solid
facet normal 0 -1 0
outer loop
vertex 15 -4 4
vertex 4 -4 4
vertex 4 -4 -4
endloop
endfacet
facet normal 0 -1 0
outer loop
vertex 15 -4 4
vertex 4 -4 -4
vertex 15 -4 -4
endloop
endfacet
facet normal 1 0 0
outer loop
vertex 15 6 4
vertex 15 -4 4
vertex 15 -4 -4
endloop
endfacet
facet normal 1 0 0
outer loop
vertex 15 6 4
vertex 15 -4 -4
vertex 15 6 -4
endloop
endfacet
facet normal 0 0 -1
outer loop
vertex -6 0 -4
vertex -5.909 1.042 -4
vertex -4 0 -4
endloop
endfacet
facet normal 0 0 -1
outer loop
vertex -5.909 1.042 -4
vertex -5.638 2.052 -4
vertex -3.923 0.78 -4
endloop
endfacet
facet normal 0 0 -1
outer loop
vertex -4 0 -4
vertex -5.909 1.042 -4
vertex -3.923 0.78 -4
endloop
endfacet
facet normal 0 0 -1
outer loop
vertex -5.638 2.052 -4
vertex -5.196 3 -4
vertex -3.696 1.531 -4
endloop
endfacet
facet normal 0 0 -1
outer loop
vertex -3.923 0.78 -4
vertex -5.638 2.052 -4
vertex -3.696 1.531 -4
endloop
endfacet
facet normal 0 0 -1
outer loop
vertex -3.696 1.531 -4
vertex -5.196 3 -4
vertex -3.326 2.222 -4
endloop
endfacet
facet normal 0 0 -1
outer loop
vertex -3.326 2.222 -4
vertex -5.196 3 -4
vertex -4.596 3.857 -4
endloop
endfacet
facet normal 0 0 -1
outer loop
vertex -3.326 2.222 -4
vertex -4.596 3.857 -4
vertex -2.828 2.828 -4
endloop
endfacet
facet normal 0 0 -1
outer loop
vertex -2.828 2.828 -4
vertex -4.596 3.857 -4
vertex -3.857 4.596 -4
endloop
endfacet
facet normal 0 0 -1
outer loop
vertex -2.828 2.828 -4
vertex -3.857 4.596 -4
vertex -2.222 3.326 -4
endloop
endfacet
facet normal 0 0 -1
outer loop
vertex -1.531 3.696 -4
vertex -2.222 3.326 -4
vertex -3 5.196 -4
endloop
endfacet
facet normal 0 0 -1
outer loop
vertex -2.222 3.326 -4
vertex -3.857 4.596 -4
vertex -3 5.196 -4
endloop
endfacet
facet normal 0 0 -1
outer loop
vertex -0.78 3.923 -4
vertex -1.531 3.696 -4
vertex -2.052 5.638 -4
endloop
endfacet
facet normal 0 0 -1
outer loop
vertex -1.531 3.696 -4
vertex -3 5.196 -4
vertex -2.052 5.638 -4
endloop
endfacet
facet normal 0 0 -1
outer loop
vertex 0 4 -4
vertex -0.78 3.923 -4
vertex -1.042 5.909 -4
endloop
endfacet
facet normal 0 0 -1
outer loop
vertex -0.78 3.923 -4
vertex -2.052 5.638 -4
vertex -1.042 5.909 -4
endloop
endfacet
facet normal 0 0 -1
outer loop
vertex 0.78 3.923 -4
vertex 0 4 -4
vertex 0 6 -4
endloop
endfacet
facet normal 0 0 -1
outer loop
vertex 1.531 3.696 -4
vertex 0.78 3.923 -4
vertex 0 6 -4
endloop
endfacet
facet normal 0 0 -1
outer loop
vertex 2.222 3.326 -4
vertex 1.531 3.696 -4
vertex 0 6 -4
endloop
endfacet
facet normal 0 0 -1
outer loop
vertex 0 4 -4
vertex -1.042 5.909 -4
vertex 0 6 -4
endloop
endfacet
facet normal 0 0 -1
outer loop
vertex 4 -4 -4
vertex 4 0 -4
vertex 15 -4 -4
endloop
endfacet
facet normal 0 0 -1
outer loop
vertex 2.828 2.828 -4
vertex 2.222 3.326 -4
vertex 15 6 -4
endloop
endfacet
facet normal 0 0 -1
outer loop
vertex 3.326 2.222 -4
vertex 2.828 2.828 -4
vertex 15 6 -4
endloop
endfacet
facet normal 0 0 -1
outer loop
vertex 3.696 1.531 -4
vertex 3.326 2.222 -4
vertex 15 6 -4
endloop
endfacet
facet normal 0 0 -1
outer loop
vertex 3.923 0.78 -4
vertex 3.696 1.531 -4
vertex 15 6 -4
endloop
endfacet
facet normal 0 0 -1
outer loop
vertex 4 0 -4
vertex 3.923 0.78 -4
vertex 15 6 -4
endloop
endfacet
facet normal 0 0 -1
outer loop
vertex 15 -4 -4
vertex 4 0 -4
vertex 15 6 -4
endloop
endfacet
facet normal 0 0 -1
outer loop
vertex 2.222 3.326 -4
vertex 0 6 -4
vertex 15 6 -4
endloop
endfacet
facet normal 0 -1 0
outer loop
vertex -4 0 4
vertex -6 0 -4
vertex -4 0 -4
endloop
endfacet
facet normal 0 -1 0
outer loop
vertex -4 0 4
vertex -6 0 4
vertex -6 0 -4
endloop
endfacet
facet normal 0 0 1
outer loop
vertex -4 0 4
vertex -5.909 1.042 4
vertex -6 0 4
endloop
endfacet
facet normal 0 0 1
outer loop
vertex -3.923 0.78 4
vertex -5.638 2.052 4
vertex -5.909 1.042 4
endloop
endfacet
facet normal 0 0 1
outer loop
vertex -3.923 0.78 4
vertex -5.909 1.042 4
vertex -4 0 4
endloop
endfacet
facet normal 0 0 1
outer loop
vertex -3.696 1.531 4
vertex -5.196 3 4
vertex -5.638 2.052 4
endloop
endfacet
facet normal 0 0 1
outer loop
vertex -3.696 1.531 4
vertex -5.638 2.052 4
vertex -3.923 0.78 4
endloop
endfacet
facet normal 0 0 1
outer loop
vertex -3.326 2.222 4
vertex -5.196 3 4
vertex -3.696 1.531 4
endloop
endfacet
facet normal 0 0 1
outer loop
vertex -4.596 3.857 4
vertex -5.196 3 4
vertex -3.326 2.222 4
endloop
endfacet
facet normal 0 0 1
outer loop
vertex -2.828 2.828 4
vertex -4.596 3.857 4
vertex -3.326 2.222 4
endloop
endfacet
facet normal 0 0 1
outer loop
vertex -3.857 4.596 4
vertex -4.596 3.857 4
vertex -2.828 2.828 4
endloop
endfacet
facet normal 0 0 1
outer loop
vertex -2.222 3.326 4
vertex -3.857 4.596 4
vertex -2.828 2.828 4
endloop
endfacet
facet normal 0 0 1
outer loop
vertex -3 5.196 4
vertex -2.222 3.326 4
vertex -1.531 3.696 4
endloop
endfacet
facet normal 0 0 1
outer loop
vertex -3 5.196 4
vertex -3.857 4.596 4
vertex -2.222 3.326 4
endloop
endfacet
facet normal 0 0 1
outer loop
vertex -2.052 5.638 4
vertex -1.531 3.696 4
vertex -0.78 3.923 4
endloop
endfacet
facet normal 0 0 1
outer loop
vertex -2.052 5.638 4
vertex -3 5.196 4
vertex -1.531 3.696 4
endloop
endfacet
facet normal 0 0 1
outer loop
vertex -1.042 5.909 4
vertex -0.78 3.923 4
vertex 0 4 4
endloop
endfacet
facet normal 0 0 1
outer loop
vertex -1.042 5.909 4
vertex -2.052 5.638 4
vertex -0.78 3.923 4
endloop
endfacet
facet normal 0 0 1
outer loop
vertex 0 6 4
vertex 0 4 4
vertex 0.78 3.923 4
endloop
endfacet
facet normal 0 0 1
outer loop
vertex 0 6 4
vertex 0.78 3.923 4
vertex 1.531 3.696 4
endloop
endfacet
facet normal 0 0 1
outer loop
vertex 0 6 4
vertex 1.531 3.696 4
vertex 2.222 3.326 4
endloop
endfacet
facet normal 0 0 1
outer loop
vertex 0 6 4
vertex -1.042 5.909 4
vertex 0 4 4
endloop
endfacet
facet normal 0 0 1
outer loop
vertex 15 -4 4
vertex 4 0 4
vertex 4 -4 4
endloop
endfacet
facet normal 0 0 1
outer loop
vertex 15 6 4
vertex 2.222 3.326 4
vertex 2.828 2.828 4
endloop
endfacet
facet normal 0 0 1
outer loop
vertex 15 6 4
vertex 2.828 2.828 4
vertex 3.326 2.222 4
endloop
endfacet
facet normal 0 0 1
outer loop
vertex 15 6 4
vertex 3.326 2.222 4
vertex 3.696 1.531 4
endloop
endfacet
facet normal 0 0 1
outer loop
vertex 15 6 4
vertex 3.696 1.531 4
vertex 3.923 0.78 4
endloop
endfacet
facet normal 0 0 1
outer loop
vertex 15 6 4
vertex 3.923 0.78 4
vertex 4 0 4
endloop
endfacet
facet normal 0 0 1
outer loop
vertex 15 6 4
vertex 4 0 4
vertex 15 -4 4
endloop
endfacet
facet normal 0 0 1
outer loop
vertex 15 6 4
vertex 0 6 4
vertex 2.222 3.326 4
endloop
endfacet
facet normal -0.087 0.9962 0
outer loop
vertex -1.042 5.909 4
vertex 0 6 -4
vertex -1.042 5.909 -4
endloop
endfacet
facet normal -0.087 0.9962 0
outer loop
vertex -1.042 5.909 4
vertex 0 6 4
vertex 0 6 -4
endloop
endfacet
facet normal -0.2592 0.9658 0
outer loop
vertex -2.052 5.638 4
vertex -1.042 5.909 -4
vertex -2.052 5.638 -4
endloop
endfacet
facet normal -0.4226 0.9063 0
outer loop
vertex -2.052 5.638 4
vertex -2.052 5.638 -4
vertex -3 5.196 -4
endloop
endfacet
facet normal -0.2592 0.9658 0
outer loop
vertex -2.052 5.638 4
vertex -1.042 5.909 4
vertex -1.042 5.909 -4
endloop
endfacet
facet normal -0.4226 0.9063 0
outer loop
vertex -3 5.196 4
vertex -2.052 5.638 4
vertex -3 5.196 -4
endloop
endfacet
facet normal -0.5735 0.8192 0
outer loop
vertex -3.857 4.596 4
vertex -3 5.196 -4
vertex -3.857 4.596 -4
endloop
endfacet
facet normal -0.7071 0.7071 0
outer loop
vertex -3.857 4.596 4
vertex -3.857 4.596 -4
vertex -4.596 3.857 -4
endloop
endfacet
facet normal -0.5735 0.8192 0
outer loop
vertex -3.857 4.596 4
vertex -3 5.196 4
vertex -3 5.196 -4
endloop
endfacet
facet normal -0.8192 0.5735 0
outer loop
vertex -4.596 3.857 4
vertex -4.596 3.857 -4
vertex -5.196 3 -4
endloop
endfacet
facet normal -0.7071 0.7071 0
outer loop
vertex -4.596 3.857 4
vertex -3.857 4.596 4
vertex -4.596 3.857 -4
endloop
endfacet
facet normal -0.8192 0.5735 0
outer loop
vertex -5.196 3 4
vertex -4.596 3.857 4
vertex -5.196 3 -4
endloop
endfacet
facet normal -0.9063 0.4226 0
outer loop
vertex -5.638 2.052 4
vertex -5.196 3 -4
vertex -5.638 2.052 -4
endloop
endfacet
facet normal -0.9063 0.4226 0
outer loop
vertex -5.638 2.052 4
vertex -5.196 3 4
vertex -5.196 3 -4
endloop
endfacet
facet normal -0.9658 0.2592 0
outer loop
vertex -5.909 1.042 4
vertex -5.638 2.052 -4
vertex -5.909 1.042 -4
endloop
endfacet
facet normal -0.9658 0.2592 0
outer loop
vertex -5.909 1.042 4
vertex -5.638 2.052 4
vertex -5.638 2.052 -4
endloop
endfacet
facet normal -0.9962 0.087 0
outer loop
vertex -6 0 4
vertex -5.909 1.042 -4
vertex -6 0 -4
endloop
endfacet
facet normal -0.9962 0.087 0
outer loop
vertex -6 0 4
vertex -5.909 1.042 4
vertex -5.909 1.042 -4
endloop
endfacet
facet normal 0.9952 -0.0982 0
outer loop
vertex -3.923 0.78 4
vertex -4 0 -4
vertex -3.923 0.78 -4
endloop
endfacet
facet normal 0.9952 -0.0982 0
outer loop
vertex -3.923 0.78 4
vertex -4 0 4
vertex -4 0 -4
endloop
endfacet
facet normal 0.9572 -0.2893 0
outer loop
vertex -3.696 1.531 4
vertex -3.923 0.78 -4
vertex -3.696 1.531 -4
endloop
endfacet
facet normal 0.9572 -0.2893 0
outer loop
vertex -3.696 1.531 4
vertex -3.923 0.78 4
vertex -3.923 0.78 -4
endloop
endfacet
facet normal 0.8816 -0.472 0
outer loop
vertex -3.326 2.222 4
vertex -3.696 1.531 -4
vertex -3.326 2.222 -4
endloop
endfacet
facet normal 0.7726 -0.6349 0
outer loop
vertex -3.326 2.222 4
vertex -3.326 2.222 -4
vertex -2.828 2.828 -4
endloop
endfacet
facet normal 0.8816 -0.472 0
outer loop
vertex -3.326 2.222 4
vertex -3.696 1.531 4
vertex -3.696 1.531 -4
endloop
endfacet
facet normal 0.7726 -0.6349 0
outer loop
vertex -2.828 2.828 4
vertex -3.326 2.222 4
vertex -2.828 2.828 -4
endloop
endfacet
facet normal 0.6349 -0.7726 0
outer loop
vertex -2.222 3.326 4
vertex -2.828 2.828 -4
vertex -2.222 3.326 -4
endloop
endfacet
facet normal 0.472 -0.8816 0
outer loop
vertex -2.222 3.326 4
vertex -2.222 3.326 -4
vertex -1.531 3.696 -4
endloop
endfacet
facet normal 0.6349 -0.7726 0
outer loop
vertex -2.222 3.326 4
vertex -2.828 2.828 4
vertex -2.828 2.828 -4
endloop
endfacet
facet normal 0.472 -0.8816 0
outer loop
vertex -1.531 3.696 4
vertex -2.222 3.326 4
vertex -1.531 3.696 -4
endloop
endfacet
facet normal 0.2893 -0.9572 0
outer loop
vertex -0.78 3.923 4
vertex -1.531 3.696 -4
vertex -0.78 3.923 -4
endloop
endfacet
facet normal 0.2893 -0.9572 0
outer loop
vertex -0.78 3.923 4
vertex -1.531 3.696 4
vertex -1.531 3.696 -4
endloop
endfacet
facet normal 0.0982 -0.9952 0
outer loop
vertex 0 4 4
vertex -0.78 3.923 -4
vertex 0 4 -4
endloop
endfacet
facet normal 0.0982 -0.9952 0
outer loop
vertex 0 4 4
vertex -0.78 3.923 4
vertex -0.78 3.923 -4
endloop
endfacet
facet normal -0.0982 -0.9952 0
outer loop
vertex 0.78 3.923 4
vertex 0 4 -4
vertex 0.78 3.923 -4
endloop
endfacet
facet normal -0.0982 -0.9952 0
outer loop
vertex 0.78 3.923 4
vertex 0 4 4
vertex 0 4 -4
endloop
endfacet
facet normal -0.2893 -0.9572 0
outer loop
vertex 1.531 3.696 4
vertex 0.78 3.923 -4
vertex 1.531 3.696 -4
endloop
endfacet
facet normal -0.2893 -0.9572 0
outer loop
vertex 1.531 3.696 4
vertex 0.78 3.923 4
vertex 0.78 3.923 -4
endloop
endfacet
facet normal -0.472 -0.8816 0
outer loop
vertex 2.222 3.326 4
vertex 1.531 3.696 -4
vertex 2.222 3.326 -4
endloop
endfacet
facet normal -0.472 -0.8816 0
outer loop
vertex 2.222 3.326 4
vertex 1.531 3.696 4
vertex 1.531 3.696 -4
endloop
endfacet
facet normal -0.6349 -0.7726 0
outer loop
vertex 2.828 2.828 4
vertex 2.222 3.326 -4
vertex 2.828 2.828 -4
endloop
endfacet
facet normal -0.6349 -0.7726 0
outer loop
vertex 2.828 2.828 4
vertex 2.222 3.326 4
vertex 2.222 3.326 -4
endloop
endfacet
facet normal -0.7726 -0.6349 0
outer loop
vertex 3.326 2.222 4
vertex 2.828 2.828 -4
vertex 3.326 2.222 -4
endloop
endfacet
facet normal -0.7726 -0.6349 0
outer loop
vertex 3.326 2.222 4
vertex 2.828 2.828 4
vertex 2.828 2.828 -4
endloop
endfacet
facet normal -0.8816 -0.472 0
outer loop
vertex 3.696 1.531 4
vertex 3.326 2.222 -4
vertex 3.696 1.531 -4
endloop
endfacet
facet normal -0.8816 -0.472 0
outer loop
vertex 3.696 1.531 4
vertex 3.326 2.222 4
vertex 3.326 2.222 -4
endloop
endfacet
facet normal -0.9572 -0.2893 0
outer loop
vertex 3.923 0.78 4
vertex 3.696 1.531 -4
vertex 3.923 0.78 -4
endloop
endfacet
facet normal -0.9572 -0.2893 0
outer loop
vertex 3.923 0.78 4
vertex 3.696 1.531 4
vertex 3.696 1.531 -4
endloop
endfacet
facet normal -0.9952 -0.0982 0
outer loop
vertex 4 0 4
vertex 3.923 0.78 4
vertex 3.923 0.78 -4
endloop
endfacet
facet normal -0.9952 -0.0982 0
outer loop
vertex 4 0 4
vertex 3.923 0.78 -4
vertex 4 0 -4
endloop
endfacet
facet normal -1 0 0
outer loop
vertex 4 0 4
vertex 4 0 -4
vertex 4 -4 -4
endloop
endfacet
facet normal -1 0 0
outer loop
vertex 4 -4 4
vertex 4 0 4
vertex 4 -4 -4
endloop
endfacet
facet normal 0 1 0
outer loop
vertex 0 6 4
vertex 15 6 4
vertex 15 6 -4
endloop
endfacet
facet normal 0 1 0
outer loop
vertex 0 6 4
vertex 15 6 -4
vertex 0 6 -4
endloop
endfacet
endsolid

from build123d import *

# Parameters (mm, degrees)
F1_DEPTH = 4


with BuildPart() as f1:
    # F0 (on Top) → F1 (new body, symmetric)
    with BuildSketch(Plane.XY):
        with BuildLine():
            ThreePointArc((-4, 0), (0, 4), (4, 0))
            Line((4, 0), (4, -4))
            Line((4, -4), (15, -4))
            Line((15, -4), (15, 6))
            Line((15, 6), (0, 6))
            ThreePointArc((0, 6), (-4.242641, 4.242641), (-6, 0))
            Line((-6, 0), (-4, 0))
        make_face()
    extrude(amount=F1_DEPTH, both=True)


solid = f1.part
